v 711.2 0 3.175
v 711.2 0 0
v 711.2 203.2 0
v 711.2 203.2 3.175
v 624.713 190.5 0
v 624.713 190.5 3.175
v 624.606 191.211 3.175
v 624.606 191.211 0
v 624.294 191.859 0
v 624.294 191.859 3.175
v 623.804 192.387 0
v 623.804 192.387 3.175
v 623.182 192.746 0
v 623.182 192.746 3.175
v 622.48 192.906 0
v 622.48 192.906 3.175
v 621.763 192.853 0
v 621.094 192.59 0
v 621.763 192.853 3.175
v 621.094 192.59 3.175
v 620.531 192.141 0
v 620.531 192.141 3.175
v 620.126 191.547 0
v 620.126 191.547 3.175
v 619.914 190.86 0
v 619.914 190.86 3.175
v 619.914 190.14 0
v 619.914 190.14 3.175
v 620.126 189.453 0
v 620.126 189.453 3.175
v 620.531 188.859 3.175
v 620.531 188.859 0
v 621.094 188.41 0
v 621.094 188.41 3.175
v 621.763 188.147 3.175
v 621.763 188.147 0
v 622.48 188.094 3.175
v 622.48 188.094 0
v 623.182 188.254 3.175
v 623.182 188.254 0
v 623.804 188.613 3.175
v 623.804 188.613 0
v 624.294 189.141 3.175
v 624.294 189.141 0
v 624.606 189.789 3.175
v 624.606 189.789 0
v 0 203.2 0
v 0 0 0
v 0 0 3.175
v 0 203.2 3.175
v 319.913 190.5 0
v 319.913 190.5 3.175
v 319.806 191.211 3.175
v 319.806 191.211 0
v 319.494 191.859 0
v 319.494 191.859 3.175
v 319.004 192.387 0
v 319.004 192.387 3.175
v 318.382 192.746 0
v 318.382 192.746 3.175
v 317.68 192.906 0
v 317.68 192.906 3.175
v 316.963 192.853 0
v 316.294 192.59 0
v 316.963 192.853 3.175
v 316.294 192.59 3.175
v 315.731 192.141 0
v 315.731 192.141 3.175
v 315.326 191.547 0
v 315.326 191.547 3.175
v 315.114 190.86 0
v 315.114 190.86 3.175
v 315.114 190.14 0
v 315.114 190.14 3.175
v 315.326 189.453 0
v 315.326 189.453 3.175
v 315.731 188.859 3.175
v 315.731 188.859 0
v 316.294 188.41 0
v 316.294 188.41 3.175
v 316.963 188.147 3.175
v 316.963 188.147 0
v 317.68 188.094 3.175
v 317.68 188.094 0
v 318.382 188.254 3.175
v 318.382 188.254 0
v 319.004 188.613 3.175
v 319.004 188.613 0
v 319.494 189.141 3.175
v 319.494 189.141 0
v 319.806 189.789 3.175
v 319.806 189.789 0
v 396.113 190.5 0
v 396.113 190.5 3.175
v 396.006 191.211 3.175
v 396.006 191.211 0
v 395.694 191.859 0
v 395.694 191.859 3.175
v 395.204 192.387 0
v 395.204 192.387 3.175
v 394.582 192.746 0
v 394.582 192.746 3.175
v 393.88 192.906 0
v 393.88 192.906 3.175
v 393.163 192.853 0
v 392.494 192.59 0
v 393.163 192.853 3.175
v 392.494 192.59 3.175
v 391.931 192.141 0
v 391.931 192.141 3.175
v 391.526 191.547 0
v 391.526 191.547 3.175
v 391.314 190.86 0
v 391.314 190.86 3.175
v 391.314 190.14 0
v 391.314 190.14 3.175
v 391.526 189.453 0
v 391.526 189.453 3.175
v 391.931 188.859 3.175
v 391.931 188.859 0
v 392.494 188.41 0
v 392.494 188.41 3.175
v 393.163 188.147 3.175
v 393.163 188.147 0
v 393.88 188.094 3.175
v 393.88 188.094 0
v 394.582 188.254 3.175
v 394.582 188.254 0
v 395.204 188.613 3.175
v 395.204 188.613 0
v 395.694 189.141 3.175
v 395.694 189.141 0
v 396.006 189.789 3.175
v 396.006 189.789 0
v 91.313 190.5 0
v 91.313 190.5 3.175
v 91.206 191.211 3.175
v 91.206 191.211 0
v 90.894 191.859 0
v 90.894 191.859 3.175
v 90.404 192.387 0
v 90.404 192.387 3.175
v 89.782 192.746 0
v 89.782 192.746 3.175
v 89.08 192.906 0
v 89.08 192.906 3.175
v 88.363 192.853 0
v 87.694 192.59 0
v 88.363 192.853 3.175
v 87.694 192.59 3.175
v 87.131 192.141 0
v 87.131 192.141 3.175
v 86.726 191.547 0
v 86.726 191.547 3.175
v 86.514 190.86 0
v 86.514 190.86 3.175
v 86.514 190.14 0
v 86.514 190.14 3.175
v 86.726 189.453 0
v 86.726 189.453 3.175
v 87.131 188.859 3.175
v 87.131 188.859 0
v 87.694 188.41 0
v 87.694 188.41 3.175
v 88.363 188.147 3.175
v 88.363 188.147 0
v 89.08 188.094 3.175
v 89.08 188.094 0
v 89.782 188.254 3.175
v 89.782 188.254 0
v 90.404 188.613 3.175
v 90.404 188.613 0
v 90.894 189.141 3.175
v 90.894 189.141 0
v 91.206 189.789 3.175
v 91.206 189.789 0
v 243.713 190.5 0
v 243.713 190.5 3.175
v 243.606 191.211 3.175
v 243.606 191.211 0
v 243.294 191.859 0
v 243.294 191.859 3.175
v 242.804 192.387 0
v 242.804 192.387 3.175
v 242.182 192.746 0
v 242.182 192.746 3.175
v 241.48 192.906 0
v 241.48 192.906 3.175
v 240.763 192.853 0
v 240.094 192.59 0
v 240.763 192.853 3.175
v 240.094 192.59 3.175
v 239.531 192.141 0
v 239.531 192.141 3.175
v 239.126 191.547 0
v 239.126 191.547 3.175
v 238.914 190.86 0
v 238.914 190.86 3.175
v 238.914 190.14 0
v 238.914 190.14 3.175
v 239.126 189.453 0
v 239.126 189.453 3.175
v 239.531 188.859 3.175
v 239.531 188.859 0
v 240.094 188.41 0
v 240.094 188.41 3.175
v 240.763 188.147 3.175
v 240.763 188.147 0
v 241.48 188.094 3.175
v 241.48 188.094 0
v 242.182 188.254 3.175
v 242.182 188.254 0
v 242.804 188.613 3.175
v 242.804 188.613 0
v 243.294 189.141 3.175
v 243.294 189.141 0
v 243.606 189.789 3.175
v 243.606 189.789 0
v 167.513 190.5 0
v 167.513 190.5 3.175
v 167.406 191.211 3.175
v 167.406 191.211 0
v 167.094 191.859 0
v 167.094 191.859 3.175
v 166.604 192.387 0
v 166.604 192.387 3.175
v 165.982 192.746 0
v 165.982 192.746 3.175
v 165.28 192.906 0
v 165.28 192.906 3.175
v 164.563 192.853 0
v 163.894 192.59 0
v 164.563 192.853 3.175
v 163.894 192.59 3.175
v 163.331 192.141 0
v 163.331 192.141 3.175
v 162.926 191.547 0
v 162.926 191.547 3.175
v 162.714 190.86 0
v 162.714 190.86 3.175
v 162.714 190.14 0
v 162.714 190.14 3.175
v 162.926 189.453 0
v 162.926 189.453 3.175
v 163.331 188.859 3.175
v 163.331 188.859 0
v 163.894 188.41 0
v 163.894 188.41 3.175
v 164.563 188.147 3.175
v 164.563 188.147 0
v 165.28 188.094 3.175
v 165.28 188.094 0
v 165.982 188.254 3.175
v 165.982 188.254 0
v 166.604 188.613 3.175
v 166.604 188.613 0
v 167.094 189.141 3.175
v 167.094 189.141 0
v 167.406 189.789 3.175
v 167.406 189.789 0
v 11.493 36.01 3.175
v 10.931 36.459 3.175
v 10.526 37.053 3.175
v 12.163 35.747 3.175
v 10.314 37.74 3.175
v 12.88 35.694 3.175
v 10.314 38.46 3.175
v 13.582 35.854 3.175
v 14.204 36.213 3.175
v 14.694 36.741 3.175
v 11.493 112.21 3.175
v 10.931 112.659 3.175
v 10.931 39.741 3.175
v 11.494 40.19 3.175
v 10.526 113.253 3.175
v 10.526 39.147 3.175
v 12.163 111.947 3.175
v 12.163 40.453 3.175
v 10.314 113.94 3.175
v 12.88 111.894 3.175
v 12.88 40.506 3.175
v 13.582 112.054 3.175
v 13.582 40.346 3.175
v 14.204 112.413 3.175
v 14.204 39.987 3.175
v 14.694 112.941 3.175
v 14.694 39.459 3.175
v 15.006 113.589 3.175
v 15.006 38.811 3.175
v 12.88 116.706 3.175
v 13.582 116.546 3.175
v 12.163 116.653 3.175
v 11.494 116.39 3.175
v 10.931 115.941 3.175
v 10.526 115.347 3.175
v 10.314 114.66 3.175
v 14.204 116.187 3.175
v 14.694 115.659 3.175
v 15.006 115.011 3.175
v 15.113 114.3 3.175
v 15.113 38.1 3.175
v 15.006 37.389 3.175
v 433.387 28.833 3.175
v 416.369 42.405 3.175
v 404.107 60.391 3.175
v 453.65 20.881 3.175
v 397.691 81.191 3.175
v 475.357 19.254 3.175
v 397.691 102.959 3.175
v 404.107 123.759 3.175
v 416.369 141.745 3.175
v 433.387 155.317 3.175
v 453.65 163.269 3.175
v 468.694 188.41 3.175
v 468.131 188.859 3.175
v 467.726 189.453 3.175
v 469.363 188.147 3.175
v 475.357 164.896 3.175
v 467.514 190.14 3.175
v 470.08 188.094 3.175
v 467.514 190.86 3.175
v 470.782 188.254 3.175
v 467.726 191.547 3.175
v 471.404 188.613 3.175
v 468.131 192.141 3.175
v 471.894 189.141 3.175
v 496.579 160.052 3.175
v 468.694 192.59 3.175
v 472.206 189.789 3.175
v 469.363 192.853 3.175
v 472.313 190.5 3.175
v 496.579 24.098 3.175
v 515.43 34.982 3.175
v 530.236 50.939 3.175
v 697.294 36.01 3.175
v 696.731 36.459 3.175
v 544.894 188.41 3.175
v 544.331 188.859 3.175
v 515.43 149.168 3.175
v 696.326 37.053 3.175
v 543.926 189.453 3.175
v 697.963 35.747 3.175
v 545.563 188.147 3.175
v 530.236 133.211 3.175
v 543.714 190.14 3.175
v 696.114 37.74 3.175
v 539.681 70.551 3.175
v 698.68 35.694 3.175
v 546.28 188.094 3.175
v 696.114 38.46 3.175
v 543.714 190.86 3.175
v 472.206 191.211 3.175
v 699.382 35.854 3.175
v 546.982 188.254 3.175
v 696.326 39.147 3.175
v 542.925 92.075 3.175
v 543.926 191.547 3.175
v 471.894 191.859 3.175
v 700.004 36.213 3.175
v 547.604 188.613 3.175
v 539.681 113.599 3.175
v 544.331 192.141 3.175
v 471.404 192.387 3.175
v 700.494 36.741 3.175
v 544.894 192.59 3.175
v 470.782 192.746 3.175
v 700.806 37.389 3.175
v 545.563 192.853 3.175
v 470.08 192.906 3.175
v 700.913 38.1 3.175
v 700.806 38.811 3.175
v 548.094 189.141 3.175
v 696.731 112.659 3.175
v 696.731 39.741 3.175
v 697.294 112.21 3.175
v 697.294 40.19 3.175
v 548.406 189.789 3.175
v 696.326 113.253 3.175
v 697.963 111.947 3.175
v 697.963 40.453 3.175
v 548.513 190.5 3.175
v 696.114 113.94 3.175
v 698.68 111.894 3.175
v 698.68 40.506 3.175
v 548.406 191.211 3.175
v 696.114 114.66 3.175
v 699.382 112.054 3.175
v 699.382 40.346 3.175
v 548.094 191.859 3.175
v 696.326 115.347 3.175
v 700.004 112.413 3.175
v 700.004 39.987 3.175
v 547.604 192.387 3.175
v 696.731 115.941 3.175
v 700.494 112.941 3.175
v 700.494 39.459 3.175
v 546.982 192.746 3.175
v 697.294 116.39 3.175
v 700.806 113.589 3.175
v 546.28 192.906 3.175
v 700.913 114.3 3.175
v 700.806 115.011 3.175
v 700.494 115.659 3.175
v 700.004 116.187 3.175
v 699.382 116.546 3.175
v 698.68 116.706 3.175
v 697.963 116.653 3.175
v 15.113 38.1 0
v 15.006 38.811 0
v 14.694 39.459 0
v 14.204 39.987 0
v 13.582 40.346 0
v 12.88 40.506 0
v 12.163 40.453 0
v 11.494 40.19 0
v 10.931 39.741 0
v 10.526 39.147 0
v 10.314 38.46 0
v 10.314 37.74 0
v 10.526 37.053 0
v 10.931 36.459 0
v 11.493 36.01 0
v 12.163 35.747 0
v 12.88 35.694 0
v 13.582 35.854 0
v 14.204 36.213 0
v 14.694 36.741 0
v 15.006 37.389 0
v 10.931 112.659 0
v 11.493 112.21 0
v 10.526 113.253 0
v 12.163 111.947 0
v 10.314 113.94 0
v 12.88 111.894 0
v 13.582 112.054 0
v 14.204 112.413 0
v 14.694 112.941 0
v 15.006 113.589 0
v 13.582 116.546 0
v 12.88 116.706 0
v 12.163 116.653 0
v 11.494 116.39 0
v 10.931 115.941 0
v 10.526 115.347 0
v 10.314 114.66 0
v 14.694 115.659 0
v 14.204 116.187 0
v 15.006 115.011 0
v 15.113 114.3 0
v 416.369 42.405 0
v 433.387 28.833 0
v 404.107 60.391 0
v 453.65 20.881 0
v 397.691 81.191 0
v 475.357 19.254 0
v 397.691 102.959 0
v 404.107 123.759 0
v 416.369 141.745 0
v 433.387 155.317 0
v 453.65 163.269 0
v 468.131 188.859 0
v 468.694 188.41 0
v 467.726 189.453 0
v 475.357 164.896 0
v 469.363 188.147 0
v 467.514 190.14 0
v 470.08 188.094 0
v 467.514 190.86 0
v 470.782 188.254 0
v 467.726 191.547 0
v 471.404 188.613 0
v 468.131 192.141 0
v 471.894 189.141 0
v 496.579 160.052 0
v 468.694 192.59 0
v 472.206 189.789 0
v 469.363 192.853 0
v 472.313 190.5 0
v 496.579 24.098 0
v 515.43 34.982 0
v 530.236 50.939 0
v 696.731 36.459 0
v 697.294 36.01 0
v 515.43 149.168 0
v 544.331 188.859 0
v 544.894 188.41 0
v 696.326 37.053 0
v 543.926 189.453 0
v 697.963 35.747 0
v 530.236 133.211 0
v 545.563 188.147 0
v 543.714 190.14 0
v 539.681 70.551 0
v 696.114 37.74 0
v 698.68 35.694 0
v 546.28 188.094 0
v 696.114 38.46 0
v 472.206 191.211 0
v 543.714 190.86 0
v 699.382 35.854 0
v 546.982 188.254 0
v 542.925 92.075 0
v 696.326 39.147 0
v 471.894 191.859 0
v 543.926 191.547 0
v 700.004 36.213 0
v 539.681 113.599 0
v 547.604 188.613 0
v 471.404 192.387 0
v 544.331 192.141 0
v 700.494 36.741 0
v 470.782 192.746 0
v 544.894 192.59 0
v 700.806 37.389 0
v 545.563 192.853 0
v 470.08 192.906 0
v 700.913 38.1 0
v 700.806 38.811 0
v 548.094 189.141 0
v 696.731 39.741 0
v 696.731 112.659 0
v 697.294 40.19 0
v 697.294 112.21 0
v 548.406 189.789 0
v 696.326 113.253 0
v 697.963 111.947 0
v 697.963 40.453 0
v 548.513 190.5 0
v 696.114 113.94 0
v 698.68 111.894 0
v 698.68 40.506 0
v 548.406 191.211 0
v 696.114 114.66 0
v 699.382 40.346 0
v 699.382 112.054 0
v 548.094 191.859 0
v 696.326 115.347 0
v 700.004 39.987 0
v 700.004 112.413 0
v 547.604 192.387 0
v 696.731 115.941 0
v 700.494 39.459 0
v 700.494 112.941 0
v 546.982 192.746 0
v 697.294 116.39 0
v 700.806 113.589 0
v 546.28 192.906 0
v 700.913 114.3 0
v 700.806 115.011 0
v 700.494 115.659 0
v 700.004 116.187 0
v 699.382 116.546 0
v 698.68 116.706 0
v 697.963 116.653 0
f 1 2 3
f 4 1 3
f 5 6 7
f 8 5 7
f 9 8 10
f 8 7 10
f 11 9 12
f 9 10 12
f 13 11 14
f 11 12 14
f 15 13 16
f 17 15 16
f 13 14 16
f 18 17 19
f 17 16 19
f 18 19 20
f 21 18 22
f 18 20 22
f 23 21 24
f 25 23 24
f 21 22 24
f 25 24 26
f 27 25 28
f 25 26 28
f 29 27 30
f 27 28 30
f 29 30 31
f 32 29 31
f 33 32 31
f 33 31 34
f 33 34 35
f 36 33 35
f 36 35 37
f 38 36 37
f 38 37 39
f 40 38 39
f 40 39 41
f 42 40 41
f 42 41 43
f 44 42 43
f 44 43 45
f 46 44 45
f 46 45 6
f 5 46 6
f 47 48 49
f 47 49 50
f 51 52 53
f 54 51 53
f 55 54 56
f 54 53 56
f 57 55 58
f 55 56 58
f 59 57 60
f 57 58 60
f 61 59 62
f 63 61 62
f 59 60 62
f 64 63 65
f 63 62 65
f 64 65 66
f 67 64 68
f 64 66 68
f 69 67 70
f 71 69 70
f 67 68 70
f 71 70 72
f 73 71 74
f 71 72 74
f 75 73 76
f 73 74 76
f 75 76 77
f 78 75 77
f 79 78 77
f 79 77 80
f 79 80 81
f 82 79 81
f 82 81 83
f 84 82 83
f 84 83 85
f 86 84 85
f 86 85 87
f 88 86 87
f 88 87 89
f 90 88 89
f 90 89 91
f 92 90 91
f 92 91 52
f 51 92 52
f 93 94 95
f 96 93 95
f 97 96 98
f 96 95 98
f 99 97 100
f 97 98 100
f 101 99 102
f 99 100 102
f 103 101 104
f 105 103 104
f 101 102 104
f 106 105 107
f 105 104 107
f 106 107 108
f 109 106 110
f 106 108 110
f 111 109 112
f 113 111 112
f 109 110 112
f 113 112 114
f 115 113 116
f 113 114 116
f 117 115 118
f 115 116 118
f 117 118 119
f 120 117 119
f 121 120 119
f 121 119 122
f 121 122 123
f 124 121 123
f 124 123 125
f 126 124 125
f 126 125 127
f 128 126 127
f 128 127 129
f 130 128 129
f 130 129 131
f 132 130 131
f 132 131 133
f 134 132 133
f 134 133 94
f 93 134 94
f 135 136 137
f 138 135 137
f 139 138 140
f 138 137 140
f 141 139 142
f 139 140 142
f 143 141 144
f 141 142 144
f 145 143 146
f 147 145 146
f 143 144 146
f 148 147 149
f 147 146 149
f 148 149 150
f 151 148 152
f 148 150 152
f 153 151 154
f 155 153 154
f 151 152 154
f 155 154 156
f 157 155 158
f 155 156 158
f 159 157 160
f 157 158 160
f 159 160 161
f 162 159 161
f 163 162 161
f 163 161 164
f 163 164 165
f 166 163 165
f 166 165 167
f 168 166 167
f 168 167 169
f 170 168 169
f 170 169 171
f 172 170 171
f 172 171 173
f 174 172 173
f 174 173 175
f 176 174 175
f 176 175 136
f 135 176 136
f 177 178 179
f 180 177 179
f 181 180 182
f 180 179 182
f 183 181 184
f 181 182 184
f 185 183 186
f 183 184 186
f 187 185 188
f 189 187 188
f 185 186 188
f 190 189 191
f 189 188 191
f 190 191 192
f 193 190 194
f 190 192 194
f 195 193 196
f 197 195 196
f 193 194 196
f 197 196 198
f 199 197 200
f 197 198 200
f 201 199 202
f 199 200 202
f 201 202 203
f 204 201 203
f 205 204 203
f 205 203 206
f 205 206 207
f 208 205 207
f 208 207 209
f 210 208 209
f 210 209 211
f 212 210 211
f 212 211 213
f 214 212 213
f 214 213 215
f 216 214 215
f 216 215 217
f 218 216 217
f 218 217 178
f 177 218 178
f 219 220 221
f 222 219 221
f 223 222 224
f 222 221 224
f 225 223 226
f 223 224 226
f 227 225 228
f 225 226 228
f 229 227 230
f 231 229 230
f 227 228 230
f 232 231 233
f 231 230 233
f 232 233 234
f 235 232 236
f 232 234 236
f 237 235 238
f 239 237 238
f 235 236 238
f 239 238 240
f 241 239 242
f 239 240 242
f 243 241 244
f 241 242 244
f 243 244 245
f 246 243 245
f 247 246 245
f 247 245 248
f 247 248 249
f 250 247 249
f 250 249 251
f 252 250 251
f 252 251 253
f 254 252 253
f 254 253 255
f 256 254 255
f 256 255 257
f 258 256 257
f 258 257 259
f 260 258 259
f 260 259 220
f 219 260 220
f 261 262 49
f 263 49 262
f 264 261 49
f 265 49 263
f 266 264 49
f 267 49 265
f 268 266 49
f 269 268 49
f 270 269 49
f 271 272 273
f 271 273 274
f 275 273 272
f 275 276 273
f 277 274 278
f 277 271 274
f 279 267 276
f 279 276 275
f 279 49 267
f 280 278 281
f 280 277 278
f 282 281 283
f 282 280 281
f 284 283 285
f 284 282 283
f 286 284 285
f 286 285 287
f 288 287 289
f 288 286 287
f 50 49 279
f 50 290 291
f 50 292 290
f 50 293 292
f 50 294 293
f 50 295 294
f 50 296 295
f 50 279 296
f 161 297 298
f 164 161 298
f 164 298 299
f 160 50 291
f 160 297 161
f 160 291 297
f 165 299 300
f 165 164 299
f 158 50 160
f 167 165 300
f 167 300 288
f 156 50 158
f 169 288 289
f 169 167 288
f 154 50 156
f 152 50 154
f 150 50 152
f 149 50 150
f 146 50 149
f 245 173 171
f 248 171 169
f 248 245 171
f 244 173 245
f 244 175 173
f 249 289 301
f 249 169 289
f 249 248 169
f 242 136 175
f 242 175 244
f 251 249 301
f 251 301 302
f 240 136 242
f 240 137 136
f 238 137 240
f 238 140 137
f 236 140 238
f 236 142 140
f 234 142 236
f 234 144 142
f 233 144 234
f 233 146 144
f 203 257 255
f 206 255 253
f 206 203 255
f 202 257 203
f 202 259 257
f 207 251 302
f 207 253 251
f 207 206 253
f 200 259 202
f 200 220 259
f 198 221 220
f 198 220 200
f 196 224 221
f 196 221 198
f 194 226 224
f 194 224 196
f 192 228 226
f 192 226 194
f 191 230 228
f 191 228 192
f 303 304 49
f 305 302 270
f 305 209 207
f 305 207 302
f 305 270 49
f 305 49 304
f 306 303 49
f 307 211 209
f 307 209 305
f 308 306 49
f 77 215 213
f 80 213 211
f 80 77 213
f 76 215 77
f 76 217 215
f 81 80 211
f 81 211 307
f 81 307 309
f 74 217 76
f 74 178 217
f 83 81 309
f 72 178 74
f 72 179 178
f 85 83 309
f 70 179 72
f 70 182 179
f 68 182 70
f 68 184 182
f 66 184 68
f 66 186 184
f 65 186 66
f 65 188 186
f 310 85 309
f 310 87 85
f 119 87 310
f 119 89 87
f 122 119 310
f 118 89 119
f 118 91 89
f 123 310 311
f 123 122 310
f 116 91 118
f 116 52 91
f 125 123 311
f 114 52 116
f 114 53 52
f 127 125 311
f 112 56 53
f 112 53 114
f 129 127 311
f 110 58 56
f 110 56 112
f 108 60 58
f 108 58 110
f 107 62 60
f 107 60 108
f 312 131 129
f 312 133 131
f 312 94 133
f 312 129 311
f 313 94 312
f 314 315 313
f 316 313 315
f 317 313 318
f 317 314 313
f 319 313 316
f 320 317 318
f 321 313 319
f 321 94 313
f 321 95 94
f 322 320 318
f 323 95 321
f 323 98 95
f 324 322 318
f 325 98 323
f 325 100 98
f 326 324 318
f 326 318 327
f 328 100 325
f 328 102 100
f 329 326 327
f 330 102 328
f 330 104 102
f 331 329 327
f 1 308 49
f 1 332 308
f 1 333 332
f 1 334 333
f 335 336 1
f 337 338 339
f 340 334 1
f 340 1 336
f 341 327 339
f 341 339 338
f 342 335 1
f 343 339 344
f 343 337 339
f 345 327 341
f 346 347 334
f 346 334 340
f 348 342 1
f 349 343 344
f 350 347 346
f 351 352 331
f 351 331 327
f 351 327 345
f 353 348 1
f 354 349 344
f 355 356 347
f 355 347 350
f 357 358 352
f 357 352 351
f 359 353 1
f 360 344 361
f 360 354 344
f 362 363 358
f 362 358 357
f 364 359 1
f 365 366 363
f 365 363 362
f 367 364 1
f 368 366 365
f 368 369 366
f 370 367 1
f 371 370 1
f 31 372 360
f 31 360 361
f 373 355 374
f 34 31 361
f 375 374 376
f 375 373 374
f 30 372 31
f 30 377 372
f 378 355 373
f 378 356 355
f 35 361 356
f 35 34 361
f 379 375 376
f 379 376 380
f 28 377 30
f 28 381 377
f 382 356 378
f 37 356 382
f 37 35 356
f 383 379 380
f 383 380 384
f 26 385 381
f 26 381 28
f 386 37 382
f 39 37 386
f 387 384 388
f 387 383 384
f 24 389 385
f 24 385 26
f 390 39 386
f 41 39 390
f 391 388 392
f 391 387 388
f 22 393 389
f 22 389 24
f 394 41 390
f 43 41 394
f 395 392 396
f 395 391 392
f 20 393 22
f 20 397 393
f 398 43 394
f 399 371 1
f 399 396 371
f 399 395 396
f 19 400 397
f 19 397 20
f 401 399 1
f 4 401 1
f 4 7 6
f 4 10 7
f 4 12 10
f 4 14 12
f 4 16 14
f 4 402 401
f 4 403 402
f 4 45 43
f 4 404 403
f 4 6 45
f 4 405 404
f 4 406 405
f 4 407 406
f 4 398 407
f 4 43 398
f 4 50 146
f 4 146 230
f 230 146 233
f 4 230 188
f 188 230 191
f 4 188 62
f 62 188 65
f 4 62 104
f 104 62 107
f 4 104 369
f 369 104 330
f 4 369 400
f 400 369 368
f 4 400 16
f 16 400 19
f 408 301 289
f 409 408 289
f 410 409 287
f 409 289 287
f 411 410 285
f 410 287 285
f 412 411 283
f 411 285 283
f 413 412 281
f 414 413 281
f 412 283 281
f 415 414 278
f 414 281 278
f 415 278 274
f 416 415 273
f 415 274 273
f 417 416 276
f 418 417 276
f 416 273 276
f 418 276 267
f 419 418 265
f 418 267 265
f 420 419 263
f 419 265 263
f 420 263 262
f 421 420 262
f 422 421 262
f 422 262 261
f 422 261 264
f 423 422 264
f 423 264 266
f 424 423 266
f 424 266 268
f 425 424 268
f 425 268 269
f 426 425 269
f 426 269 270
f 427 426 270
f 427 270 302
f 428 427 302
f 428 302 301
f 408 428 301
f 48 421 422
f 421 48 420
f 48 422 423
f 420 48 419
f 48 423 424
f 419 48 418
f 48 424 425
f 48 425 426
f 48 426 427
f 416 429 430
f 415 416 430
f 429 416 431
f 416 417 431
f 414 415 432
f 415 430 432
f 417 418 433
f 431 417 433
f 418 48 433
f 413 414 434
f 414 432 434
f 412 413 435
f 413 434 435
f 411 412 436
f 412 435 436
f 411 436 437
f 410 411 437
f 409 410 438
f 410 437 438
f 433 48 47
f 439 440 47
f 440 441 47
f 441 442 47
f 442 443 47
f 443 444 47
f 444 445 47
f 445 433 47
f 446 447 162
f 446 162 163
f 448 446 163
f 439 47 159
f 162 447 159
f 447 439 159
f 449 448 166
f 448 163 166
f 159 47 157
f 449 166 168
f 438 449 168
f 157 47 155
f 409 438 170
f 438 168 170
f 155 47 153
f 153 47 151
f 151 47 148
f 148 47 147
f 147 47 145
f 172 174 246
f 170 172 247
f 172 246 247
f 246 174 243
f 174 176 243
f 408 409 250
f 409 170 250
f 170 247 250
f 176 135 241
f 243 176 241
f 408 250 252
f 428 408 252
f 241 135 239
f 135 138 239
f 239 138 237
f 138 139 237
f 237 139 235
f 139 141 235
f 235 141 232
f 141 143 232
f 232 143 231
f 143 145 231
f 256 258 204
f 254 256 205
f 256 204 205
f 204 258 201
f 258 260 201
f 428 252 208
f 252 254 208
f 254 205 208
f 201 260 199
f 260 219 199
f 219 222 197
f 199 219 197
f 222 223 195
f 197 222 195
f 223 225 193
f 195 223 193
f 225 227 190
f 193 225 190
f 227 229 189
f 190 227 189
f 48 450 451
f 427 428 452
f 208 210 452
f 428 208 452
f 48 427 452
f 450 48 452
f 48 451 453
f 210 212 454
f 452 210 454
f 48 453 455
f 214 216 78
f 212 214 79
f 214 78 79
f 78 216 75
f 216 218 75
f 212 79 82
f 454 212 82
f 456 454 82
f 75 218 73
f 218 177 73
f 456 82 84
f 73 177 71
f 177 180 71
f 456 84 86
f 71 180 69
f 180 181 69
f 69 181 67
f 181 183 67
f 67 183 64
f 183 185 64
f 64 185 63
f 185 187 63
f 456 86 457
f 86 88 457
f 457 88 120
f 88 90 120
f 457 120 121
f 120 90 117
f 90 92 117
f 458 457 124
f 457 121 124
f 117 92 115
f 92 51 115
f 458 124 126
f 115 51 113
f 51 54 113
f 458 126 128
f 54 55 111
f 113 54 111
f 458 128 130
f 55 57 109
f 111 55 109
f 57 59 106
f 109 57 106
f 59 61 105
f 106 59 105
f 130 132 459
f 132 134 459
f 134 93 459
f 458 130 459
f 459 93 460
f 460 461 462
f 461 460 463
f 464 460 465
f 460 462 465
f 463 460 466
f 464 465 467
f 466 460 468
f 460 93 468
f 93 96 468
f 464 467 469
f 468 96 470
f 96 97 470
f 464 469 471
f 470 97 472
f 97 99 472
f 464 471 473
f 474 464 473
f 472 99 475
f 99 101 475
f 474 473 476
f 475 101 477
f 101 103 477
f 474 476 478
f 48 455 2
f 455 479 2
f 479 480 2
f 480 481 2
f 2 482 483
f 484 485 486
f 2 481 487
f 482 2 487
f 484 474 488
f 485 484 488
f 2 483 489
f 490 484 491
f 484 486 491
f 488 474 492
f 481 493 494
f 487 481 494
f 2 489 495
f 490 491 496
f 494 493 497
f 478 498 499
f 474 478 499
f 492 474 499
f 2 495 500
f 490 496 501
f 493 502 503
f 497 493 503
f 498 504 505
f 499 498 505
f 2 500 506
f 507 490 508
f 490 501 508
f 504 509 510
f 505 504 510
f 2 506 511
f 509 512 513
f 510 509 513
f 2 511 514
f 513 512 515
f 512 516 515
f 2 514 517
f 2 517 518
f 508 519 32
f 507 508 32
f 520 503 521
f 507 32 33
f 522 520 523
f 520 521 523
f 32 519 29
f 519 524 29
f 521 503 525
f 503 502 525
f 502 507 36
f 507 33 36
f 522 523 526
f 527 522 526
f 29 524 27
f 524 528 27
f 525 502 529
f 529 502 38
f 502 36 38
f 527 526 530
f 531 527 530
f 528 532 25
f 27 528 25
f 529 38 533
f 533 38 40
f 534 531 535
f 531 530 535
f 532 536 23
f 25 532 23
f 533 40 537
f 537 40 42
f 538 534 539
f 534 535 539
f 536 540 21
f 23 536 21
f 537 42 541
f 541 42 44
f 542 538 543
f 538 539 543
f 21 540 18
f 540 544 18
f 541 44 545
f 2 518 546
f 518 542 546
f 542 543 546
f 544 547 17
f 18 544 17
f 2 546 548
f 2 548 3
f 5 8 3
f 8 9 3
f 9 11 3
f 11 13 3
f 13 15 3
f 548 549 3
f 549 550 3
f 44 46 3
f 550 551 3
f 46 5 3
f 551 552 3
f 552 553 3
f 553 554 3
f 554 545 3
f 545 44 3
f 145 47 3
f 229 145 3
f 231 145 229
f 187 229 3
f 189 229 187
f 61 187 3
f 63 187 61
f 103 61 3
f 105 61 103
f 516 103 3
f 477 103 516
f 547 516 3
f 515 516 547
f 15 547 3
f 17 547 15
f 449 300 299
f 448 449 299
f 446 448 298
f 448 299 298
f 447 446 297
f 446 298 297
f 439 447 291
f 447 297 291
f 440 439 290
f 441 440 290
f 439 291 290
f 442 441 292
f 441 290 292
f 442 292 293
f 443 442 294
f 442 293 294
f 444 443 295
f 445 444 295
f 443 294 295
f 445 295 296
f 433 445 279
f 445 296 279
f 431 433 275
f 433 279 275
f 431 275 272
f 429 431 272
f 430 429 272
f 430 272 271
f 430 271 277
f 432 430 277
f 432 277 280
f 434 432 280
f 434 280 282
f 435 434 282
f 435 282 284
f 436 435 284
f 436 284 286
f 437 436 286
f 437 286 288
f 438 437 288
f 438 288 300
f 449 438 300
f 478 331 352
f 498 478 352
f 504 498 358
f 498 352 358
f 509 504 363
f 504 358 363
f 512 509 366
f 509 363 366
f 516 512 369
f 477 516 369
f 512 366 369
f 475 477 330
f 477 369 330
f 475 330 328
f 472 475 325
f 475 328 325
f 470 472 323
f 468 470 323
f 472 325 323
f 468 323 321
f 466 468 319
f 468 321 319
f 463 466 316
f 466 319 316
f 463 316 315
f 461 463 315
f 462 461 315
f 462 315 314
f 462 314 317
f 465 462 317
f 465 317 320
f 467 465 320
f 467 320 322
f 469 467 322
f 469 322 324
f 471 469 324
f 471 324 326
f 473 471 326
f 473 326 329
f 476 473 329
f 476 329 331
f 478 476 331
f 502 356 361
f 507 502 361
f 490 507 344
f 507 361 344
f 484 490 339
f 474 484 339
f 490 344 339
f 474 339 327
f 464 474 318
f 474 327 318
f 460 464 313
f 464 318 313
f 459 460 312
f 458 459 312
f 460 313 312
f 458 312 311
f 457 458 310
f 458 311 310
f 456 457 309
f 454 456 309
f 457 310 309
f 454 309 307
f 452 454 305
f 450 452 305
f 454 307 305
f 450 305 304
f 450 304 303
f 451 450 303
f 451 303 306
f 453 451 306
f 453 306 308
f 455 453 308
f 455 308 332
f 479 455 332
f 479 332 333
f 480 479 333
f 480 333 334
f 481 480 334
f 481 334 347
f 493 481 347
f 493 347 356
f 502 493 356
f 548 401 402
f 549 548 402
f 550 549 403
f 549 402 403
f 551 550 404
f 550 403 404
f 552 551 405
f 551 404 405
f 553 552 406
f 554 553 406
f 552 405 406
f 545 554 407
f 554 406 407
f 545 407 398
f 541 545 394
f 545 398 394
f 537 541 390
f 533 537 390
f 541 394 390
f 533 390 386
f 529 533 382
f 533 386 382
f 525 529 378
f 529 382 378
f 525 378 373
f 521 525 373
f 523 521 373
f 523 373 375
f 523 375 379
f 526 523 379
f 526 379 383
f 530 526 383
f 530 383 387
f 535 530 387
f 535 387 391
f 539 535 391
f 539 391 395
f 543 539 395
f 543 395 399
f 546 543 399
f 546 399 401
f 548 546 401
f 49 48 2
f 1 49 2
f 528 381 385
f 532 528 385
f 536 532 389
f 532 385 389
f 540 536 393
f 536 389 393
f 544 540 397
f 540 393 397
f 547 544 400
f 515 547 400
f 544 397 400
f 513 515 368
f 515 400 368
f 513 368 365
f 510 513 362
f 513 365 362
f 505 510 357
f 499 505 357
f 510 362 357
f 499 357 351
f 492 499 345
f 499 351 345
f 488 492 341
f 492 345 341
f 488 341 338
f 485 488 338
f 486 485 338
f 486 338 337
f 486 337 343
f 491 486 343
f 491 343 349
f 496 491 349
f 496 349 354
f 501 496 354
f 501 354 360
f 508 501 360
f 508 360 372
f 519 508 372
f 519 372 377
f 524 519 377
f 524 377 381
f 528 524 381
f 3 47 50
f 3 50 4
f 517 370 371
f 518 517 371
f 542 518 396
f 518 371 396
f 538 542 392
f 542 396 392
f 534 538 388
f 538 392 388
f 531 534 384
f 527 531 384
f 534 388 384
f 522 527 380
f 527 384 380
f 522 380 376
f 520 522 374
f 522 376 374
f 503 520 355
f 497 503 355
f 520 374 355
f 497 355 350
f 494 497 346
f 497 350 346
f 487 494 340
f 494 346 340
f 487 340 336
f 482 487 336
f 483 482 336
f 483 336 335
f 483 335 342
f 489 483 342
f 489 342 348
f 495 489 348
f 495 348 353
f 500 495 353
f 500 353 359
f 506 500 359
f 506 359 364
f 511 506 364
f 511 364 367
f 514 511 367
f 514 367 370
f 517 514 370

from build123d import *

# Parameters (mm, degrees)
SKETCH1_W           = 711.2
SKETCH1_H           = 203.2
BOSS_EXTRUDE1_DEPTH = 3.175
CUT_EXTRUDE1_REACH  = 5.175
SKETCH2_R           = 2.413
CUT_EXTRUDE2_REACH  = 5.175
SKETCH3_R           = 73.025


with BuildPart() as part:
    # Sketch1 → Boss-Extrude1 (new body)
    with BuildSketch(Plane.XY):
        with Locations((355.6, 101.6)):
            Rectangle(SKETCH1_W, SKETCH1_H)
    extrude(amount=BOSS_EXTRUDE1_DEPTH)

    # Sketch2 → Cut-Extrude1 (cut, up to next)
    with BuildSketch(Plane.XY.offset(3.175), mode=Mode.PRIVATE) as cut_extrude1_sk1:
        with Locations((12.7, 114.3)):
            Circle(SKETCH2_R)
    cut_extrude1_tool1 = extrude(cut_extrude1_sk1.sketch, amount=-CUT_EXTRUDE1_REACH, mode=Mode.PRIVATE) & part.part
    add(cut_extrude1_tool1.solids().sort_by_distance((12.7, 114.3, 3.175))[0], mode=Mode.SUBTRACT)
    # Sketch2 → Cut-Extrude1 (cut, up to next)
    with BuildSketch(Plane.XY.offset(3.175), mode=Mode.PRIVATE) as cut_extrude1_sk2:
        with Locations((698.5, 114.3)):
            Circle(SKETCH2_R)
    cut_extrude1_tool2 = extrude(cut_extrude1_sk2.sketch, amount=-CUT_EXTRUDE1_REACH, mode=Mode.PRIVATE) & part.part
    add(cut_extrude1_tool2.solids().sort_by_distance((698.5, 114.3, 3.175))[0], mode=Mode.SUBTRACT)
    # Sketch2 → Cut-Extrude1 (cut, up to next)
    with BuildSketch(Plane.XY.offset(3.175), mode=Mode.PRIVATE) as cut_extrude1_sk3:
        with Locations((12.7, 38.1)):
            Circle(SKETCH2_R)
    cut_extrude1_tool3 = extrude(cut_extrude1_sk3.sketch, amount=-CUT_EXTRUDE1_REACH, mode=Mode.PRIVATE) & part.part
    add(cut_extrude1_tool3.solids().sort_by_distance((12.7, 38.1, 3.175))[0], mode=Mode.SUBTRACT)
    # Sketch2 → Cut-Extrude1 (cut, up to next)
    with BuildSketch(Plane.XY.offset(3.175), mode=Mode.PRIVATE) as cut_extrude1_sk4:
        with Locations((698.5, 38.1)):
            Circle(SKETCH2_R)
    cut_extrude1_tool4 = extrude(cut_extrude1_sk4.sketch, amount=-CUT_EXTRUDE1_REACH, mode=Mode.PRIVATE) & part.part
    add(cut_extrude1_tool4.solids().sort_by_distance((698.5, 38.1, 3.175))[0], mode=Mode.SUBTRACT)
    # Sketch2 → Cut-Extrude1 (cut, up to next)
    with BuildSketch(Plane.XY.offset(3.175), mode=Mode.PRIVATE) as cut_extrude1_sk5:
        with Locations((88.9, 190.5)):
            Circle(SKETCH2_R)
    cut_extrude1_tool5 = extrude(cut_extrude1_sk5.sketch, amount=-CUT_EXTRUDE1_REACH, mode=Mode.PRIVATE) & part.part
    add(cut_extrude1_tool5.solids().sort_by_distance((88.9, 190.5, 3.175))[0], mode=Mode.SUBTRACT)
    # Sketch2 → Cut-Extrude1 (cut, up to next)
    with BuildSketch(Plane.XY.offset(3.175), mode=Mode.PRIVATE) as cut_extrude1_sk6:
        with Locations((165.1, 190.5)):
            Circle(SKETCH2_R)
    cut_extrude1_tool6 = extrude(cut_extrude1_sk6.sketch, amount=-CUT_EXTRUDE1_REACH, mode=Mode.PRIVATE) & part.part
    add(cut_extrude1_tool6.solids().sort_by_distance((165.1, 190.5, 3.175))[0], mode=Mode.SUBTRACT)
    # Sketch2 → Cut-Extrude1 (cut, up to next)
    with BuildSketch(Plane.XY.offset(3.175), mode=Mode.PRIVATE) as cut_extrude1_sk7:
        with Locations((241.3, 190.5)):
            Circle(SKETCH2_R)
    cut_extrude1_tool7 = extrude(cut_extrude1_sk7.sketch, amount=-CUT_EXTRUDE1_REACH, mode=Mode.PRIVATE) & part.part
    add(cut_extrude1_tool7.solids().sort_by_distance((241.3, 190.5, 3.175))[0], mode=Mode.SUBTRACT)
    # Sketch2 → Cut-Extrude1 (cut, up to next)
    with BuildSketch(Plane.XY.offset(3.175), mode=Mode.PRIVATE) as cut_extrude1_sk8:
        with Locations((622.3, 190.5)):
            Circle(SKETCH2_R)
    cut_extrude1_tool8 = extrude(cut_extrude1_sk8.sketch, amount=-CUT_EXTRUDE1_REACH, mode=Mode.PRIVATE) & part.part
    add(cut_extrude1_tool8.solids().sort_by_distance((622.3, 190.5, 3.175))[0], mode=Mode.SUBTRACT)
    # Sketch2 → Cut-Extrude1 (cut, up to next)
    with BuildSketch(Plane.XY.offset(3.175), mode=Mode.PRIVATE) as cut_extrude1_sk9:
        with Locations((546.1, 190.5)):
            Circle(SKETCH2_R)
    cut_extrude1_tool9 = extrude(cut_extrude1_sk9.sketch, amount=-CUT_EXTRUDE1_REACH, mode=Mode.PRIVATE) & part.part
    add(cut_extrude1_tool9.solids().sort_by_distance((546.1, 190.5, 3.175))[0], mode=Mode.SUBTRACT)
    # Sketch2 → Cut-Extrude1 (cut, up to next)
    with BuildSketch(Plane.XY.offset(3.175), mode=Mode.PRIVATE) as cut_extrude1_sk10:
        with Locations((469.9, 190.5)):
            Circle(SKETCH2_R)
    cut_extrude1_tool10 = extrude(cut_extrude1_sk10.sketch, amount=-CUT_EXTRUDE1_REACH, mode=Mode.PRIVATE) & part.part
    add(cut_extrude1_tool10.solids().sort_by_distance((469.9, 190.5, 3.175))[0], mode=Mode.SUBTRACT)
    # Sketch2 → Cut-Extrude1 (cut, up to next)
    with BuildSketch(Plane.XY.offset(3.175), mode=Mode.PRIVATE) as cut_extrude1_sk11:
        with Locations((393.7, 190.5)):
            Circle(SKETCH2_R)
    cut_extrude1_tool11 = extrude(cut_extrude1_sk11.sketch, amount=-CUT_EXTRUDE1_REACH, mode=Mode.PRIVATE) & part.part
    add(cut_extrude1_tool11.solids().sort_by_distance((393.7, 190.5, 3.175))[0], mode=Mode.SUBTRACT)
    # Sketch2 → Cut-Extrude1 (cut, up to next)
    with BuildSketch(Plane.XY.offset(3.175), mode=Mode.PRIVATE) as cut_extrude1_sk12:
        with Locations((317.5, 190.5)):
            Circle(SKETCH2_R)
    cut_extrude1_tool12 = extrude(cut_extrude1_sk12.sketch, amount=-CUT_EXTRUDE1_REACH, mode=Mode.PRIVATE) & part.part
    add(cut_extrude1_tool12.solids().sort_by_distance((317.5, 190.5, 3.175))[0], mode=Mode.SUBTRACT)

    # Sketch3 → Cut-Extrude2 (cut, up to next)
    with BuildSketch(Plane.XY.offset(3.175), mode=Mode.PRIVATE) as cut_extrude2_sk1:
        with Locations((469.9, 92.075)):
            Circle(SKETCH3_R)
    cut_extrude2_tool1 = extrude(cut_extrude2_sk1.sketch, amount=-CUT_EXTRUDE2_REACH, mode=Mode.PRIVATE) & part.part
    add(cut_extrude2_tool1.solids().sort_by_distance((469.9, 92.075, 3.175))[0], mode=Mode.SUBTRACT)


solid = part.part
